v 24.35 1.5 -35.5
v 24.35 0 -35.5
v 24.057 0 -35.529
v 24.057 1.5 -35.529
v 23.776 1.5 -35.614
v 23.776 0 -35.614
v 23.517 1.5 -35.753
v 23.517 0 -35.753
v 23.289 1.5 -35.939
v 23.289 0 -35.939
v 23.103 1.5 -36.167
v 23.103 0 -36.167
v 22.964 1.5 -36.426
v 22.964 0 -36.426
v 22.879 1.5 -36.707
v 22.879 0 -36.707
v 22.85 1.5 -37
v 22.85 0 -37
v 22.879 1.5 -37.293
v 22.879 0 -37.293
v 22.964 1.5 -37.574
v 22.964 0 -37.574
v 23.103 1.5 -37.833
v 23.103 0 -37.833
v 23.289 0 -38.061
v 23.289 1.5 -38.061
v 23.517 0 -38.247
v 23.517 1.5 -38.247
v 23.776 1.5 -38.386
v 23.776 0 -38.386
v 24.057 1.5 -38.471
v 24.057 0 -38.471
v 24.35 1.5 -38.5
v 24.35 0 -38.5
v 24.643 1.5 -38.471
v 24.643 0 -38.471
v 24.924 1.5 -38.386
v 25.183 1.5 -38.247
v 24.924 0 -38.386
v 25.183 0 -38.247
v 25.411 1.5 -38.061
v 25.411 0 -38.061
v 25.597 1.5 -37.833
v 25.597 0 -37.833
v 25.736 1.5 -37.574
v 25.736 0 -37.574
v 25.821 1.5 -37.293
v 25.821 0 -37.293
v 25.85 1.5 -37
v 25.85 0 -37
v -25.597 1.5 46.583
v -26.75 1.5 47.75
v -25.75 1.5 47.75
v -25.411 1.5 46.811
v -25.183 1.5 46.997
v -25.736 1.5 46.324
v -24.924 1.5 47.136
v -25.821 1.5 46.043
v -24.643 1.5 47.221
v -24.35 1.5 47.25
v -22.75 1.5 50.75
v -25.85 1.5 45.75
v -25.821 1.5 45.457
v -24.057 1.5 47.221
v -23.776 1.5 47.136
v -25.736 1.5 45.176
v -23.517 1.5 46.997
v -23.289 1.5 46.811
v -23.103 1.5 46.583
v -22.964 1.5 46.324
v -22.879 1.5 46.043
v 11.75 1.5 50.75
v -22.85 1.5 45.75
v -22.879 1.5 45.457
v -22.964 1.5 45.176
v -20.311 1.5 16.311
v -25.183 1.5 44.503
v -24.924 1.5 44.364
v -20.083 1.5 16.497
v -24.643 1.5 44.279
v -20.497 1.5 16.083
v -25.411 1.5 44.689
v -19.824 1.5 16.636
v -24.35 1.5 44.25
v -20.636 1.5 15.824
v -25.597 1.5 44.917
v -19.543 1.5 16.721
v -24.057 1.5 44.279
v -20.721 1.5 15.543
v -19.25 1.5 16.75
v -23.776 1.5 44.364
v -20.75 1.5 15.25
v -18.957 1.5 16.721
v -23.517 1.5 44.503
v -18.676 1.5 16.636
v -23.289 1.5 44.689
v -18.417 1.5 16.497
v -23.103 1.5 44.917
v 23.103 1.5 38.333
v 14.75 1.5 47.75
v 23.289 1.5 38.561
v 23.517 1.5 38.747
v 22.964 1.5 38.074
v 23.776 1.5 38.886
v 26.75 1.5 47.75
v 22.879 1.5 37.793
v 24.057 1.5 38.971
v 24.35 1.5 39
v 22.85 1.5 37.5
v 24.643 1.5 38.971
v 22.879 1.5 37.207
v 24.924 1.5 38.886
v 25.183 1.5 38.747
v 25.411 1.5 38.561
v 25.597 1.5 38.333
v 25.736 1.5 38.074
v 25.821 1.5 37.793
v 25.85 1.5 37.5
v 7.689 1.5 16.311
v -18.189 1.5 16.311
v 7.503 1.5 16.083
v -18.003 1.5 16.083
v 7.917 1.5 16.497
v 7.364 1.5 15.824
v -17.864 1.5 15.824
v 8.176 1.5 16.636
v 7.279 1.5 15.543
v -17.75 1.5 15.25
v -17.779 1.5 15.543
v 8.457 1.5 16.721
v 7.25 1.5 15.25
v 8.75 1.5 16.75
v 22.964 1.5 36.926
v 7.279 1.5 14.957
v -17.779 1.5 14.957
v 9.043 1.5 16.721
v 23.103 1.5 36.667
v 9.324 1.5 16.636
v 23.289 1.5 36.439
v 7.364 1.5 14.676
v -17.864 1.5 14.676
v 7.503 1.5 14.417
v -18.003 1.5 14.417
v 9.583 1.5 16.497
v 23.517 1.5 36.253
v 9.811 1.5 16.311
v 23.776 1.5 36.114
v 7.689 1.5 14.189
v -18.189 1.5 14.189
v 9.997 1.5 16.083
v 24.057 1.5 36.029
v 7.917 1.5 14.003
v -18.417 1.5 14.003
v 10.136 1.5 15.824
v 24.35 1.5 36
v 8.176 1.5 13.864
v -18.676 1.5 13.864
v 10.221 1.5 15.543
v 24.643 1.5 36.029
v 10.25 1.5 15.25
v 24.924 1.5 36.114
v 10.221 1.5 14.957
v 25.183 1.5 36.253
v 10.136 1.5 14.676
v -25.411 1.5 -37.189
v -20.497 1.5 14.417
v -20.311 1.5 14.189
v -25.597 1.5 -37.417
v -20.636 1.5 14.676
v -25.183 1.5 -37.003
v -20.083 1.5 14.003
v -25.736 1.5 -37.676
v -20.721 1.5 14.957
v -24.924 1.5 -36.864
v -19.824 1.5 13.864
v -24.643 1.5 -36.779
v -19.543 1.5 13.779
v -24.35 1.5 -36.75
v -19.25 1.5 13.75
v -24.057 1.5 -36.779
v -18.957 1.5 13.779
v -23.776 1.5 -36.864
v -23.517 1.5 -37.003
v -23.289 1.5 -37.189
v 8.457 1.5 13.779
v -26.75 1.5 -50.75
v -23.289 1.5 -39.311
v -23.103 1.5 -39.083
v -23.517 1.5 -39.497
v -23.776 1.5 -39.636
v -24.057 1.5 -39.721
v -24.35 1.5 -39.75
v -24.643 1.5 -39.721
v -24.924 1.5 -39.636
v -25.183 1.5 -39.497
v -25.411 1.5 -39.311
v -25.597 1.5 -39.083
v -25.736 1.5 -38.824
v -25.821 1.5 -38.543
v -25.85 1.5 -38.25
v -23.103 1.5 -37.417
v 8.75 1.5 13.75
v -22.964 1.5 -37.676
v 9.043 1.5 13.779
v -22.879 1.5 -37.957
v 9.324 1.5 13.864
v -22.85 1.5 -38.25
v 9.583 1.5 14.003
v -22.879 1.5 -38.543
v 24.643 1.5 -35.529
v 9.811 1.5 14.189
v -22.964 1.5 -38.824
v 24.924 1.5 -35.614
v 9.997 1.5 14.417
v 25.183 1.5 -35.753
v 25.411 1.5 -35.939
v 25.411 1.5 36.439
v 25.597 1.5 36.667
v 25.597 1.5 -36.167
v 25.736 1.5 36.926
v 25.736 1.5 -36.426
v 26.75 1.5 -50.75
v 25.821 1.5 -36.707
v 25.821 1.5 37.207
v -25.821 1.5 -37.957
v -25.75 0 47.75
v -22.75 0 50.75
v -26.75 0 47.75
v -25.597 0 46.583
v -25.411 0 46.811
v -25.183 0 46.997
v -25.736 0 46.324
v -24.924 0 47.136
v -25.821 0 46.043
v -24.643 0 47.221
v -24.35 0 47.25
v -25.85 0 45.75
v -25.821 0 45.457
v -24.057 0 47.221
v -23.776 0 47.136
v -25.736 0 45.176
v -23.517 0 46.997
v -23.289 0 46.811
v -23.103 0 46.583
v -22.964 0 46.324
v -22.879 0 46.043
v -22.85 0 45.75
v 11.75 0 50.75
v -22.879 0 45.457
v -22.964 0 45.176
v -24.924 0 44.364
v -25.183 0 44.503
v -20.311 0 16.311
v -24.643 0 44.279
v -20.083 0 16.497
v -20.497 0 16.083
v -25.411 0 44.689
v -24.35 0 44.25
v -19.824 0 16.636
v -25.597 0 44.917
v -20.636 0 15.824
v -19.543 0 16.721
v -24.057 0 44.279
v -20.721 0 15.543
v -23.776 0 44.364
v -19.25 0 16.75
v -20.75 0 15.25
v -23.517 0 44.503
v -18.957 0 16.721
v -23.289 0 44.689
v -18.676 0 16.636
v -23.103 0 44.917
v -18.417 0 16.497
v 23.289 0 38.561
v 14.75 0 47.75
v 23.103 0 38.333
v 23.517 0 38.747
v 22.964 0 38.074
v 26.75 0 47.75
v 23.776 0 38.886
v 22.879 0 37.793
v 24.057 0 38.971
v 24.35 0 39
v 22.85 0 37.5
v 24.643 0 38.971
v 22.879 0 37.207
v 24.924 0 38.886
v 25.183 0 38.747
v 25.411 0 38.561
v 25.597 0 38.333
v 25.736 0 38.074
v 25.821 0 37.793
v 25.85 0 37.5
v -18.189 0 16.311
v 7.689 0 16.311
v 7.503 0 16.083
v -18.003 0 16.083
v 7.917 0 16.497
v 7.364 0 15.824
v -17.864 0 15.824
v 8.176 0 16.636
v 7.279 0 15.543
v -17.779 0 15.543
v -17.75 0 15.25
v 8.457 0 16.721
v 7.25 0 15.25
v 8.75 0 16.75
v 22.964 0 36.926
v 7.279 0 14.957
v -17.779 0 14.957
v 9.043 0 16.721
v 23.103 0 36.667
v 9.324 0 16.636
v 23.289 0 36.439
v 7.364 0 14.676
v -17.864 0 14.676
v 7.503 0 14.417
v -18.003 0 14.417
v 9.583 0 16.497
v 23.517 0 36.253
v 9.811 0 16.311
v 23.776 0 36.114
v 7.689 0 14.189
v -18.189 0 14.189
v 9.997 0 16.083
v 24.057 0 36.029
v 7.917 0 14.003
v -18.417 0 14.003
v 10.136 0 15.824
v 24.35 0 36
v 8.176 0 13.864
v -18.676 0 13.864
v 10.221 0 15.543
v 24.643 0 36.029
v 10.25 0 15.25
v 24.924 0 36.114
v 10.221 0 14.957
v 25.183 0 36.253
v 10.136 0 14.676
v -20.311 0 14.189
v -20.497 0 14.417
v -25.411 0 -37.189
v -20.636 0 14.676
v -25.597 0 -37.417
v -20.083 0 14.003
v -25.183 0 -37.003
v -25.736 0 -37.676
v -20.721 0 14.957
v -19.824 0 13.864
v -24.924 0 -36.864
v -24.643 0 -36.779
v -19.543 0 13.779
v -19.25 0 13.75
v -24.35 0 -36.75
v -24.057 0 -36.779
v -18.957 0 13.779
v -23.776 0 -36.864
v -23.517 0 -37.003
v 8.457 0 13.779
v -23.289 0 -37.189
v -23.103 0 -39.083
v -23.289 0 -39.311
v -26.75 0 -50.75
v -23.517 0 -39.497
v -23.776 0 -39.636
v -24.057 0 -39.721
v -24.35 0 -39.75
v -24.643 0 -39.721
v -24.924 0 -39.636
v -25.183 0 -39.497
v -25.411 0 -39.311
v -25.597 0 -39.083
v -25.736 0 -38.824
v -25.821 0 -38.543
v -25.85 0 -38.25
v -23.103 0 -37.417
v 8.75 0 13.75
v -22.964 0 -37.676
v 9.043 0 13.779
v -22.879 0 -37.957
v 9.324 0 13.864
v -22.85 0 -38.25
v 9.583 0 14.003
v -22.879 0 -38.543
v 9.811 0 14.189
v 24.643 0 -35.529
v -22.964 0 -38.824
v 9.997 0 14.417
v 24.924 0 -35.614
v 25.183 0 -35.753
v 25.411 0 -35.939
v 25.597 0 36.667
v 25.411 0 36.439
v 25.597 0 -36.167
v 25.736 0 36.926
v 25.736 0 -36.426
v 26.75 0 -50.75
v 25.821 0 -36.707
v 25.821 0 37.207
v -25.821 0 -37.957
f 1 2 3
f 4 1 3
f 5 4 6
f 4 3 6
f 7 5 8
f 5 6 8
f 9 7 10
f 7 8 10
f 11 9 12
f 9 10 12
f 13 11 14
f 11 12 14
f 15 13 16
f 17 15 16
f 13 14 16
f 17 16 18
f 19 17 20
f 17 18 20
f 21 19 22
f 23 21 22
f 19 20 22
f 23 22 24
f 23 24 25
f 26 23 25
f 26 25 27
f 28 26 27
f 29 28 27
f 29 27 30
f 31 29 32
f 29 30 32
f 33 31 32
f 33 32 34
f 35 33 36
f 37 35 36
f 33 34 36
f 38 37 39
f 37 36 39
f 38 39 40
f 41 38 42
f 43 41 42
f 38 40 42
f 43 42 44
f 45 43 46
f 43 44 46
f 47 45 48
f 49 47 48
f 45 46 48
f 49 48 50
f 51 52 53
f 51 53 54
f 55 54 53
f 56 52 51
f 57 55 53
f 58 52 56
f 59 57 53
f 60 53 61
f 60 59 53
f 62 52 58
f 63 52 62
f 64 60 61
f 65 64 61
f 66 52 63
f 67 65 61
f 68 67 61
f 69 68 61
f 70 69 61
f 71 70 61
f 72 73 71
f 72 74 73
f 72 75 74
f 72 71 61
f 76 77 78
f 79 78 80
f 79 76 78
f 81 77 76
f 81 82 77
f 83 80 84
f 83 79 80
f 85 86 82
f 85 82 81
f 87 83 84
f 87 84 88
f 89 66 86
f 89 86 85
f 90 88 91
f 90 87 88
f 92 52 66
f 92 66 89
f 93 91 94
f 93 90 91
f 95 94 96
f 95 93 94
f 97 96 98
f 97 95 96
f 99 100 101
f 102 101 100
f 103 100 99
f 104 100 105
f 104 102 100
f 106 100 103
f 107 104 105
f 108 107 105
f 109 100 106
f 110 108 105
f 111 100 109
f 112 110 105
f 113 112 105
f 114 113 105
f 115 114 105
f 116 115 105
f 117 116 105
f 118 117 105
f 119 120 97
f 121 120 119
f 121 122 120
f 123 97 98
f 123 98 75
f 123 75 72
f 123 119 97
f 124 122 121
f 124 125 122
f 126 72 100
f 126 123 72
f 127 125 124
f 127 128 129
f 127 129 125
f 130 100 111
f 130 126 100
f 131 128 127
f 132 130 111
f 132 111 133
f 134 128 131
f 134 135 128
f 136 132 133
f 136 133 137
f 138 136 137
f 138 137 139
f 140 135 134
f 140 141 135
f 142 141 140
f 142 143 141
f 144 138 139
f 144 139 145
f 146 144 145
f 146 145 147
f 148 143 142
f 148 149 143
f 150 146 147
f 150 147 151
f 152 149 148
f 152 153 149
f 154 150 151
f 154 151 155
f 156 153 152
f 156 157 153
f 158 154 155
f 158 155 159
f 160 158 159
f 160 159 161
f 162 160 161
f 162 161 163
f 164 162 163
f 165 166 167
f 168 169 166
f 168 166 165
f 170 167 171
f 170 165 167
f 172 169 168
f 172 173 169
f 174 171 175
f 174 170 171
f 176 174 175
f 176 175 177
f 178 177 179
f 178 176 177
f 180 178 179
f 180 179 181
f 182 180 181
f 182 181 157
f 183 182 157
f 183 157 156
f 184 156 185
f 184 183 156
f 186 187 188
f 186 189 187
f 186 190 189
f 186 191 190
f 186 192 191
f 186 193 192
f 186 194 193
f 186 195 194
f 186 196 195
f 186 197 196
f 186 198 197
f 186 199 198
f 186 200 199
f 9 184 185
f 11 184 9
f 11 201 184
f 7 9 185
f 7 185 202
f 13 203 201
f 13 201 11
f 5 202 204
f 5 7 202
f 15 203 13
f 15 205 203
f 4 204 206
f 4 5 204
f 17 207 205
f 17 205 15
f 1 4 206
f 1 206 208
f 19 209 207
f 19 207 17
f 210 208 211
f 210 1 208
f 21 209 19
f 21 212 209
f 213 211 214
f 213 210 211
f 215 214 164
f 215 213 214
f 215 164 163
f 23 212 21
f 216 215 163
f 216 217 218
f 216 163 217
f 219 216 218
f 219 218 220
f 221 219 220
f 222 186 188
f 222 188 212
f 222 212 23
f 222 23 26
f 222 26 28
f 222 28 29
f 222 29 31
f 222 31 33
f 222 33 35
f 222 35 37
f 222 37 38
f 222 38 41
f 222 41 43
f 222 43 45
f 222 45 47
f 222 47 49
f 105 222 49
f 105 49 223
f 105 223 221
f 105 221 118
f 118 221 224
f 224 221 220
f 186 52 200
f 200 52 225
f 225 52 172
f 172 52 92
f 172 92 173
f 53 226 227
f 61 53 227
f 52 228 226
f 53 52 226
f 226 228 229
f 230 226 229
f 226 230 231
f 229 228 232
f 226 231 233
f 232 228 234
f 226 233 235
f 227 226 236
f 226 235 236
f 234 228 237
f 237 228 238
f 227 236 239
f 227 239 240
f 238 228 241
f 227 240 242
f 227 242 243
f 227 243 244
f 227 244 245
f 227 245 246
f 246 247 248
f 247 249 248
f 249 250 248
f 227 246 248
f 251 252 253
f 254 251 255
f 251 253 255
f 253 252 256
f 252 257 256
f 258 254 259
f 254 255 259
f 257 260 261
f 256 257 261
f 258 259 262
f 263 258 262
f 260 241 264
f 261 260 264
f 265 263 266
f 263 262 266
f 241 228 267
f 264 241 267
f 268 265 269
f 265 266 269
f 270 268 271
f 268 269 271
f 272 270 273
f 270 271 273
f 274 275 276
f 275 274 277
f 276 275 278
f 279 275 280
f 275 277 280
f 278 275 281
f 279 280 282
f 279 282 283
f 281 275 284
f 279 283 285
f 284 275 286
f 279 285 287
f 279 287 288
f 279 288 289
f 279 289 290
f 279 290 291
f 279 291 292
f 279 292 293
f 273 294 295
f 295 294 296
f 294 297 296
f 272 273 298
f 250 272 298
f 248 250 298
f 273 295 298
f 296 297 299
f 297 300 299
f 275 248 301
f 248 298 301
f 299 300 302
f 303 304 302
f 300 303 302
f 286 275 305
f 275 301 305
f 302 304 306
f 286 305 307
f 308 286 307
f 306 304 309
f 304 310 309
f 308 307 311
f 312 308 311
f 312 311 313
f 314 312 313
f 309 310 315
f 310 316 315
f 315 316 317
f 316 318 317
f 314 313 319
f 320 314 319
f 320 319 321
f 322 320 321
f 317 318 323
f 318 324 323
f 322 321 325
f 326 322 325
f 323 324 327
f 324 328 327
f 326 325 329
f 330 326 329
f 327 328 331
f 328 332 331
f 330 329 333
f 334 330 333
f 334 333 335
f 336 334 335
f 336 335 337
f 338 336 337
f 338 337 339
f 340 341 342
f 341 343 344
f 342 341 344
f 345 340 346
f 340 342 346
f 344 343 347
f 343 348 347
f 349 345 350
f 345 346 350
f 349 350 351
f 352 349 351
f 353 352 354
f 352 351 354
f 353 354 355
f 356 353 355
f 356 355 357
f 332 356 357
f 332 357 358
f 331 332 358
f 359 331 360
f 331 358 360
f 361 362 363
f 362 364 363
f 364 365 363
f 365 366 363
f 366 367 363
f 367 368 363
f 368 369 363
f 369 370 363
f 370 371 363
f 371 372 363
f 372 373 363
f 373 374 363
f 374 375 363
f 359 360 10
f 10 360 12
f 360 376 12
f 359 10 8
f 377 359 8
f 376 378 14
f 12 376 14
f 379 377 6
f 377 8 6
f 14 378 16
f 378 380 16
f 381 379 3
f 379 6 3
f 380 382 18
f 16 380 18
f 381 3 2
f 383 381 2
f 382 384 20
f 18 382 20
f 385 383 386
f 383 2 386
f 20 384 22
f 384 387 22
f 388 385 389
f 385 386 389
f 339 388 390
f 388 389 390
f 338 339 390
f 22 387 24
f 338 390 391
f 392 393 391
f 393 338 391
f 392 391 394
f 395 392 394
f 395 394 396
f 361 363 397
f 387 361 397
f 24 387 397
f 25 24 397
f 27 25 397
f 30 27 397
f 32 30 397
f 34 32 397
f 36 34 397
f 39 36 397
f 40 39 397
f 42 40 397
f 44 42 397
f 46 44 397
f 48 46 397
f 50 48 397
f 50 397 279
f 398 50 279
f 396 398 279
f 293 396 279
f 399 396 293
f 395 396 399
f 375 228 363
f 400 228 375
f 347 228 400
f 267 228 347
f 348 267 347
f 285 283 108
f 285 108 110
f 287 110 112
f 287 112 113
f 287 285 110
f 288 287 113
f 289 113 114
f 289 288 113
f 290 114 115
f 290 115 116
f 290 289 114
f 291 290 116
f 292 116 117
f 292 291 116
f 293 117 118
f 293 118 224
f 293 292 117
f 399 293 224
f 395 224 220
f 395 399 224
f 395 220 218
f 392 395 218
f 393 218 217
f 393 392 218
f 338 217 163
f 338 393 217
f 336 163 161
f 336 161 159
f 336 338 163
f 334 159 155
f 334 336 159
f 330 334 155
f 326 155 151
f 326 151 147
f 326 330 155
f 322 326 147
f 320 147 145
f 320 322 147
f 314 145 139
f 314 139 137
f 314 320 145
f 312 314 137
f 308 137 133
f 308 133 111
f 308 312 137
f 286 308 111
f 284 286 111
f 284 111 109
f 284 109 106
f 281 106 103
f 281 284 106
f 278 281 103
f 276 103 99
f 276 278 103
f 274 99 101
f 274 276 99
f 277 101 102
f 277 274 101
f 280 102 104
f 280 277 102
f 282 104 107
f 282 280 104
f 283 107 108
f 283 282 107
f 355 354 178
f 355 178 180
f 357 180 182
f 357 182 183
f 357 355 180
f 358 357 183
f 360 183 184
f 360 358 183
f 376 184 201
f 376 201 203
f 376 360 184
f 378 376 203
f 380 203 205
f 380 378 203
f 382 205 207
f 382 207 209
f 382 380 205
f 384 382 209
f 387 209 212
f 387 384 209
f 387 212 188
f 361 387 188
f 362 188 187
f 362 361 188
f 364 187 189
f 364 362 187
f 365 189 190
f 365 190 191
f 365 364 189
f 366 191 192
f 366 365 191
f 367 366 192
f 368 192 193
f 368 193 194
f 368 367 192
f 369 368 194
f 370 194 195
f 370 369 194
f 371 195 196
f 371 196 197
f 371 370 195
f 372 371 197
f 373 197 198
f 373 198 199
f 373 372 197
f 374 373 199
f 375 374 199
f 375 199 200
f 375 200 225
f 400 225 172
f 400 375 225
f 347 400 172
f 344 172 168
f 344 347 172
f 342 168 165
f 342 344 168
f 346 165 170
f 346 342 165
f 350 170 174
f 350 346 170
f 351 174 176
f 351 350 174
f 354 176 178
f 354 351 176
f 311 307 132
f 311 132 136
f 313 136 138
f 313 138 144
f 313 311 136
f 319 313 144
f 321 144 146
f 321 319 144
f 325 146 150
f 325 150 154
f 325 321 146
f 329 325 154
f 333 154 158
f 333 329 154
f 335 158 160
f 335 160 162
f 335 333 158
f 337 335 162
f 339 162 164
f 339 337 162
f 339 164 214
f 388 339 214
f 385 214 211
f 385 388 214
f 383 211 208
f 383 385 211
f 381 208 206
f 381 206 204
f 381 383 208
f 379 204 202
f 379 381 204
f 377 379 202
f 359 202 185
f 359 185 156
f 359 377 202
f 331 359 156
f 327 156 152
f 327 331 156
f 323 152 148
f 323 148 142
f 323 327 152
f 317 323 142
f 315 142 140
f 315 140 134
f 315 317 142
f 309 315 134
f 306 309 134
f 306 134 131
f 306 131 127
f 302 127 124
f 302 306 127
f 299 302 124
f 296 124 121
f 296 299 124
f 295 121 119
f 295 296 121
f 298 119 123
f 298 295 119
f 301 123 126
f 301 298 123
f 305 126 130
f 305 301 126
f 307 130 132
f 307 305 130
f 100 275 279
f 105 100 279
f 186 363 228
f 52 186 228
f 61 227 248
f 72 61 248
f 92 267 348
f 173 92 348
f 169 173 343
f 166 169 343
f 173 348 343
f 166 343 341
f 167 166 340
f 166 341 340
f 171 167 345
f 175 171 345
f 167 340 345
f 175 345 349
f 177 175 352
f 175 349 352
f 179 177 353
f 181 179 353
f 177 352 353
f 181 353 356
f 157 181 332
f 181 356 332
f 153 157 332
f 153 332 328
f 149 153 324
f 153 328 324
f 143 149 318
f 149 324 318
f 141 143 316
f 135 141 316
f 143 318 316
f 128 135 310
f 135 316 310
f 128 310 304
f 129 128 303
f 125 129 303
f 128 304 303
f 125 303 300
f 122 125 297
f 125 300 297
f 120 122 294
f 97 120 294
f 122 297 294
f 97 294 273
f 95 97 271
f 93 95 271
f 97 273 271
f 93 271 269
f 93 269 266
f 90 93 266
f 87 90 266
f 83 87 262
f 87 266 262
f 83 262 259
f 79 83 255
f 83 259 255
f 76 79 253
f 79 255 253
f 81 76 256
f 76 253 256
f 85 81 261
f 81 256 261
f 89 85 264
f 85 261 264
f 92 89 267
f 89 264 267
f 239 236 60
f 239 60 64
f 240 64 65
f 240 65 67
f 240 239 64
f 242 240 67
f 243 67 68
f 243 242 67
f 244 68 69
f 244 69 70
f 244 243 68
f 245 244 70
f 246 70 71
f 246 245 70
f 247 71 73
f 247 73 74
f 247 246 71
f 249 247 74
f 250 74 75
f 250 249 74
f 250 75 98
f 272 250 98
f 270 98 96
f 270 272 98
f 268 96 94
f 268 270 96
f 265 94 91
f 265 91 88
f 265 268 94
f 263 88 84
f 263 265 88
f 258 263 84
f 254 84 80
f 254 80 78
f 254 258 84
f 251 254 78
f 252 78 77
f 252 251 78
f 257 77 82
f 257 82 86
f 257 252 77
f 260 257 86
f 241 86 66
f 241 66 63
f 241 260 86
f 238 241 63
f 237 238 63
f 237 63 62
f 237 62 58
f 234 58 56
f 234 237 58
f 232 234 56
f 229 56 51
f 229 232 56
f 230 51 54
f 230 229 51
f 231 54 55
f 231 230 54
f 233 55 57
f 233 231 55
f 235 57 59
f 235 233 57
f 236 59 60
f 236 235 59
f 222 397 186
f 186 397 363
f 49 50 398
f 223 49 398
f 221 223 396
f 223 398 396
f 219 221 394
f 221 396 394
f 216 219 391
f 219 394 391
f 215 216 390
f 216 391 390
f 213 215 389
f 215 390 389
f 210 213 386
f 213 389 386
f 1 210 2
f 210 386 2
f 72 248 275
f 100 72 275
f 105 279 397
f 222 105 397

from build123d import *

# Parameters (mm, degrees)
SKETCH1_R           = 1.5
BOSS_EXTRUDE1_DEPTH = 1.5


with BuildPart() as part:
    # Sketch1 → Boss-Extrude1 (new body)
    with BuildSketch(Plane(origin=(0, 0, 0), x_dir=(1, 0, 0), z_dir=(0, 1, 0))):
        Polygon((-22.75, -50.75), (11.75, -50.75), (14.75, -47.75), (26.75, -47.75), (26.75, 50.75), (25.85, 50.75), (-20.75, 50.75), (-25.85, 50.75), (-26.75, 50.75), (-26.75, -47.75), (-25.75, -47.75), align=None)
        with Locations(Location((-24.35, -45.75, 0), (0, 0, 270))):
            Circle(SKETCH1_R, mode=Mode.SUBTRACT)
        with BuildLine():
            ThreePointArc((-17.75, -15.25), (-19.25, -16.75), (-20.75, -15.25))
            ThreePointArc((-20.75, -15.25), (-19.25, -13.75), (-17.75, -15.25))
        make_face(mode=Mode.SUBTRACT)
        with Locations(Location((24.35, -37.5, 0), (0, 0, 270))):
            Circle(SKETCH1_R, mode=Mode.SUBTRACT)
        with Locations(Location((8.75, -15.25, 0), (0, 0, 270))):
            Circle(SKETCH1_R, mode=Mode.SUBTRACT)
        with Locations(Location((-24.35, 38.25, 0), (0, 0, 270))):
            Circle(SKETCH1_R, mode=Mode.SUBTRACT)
        with BuildLine():
            ThreePointArc((24.35, 35.5), (23.289339828, 38.060660172), (25.85, 37))
            ThreePointArc((25.85, 37), (25.410660172, 35.939339828), (24.35, 35.5))
        make_face(mode=Mode.SUBTRACT)
    extrude(amount=BOSS_EXTRUDE1_DEPTH)


solid = part.part
